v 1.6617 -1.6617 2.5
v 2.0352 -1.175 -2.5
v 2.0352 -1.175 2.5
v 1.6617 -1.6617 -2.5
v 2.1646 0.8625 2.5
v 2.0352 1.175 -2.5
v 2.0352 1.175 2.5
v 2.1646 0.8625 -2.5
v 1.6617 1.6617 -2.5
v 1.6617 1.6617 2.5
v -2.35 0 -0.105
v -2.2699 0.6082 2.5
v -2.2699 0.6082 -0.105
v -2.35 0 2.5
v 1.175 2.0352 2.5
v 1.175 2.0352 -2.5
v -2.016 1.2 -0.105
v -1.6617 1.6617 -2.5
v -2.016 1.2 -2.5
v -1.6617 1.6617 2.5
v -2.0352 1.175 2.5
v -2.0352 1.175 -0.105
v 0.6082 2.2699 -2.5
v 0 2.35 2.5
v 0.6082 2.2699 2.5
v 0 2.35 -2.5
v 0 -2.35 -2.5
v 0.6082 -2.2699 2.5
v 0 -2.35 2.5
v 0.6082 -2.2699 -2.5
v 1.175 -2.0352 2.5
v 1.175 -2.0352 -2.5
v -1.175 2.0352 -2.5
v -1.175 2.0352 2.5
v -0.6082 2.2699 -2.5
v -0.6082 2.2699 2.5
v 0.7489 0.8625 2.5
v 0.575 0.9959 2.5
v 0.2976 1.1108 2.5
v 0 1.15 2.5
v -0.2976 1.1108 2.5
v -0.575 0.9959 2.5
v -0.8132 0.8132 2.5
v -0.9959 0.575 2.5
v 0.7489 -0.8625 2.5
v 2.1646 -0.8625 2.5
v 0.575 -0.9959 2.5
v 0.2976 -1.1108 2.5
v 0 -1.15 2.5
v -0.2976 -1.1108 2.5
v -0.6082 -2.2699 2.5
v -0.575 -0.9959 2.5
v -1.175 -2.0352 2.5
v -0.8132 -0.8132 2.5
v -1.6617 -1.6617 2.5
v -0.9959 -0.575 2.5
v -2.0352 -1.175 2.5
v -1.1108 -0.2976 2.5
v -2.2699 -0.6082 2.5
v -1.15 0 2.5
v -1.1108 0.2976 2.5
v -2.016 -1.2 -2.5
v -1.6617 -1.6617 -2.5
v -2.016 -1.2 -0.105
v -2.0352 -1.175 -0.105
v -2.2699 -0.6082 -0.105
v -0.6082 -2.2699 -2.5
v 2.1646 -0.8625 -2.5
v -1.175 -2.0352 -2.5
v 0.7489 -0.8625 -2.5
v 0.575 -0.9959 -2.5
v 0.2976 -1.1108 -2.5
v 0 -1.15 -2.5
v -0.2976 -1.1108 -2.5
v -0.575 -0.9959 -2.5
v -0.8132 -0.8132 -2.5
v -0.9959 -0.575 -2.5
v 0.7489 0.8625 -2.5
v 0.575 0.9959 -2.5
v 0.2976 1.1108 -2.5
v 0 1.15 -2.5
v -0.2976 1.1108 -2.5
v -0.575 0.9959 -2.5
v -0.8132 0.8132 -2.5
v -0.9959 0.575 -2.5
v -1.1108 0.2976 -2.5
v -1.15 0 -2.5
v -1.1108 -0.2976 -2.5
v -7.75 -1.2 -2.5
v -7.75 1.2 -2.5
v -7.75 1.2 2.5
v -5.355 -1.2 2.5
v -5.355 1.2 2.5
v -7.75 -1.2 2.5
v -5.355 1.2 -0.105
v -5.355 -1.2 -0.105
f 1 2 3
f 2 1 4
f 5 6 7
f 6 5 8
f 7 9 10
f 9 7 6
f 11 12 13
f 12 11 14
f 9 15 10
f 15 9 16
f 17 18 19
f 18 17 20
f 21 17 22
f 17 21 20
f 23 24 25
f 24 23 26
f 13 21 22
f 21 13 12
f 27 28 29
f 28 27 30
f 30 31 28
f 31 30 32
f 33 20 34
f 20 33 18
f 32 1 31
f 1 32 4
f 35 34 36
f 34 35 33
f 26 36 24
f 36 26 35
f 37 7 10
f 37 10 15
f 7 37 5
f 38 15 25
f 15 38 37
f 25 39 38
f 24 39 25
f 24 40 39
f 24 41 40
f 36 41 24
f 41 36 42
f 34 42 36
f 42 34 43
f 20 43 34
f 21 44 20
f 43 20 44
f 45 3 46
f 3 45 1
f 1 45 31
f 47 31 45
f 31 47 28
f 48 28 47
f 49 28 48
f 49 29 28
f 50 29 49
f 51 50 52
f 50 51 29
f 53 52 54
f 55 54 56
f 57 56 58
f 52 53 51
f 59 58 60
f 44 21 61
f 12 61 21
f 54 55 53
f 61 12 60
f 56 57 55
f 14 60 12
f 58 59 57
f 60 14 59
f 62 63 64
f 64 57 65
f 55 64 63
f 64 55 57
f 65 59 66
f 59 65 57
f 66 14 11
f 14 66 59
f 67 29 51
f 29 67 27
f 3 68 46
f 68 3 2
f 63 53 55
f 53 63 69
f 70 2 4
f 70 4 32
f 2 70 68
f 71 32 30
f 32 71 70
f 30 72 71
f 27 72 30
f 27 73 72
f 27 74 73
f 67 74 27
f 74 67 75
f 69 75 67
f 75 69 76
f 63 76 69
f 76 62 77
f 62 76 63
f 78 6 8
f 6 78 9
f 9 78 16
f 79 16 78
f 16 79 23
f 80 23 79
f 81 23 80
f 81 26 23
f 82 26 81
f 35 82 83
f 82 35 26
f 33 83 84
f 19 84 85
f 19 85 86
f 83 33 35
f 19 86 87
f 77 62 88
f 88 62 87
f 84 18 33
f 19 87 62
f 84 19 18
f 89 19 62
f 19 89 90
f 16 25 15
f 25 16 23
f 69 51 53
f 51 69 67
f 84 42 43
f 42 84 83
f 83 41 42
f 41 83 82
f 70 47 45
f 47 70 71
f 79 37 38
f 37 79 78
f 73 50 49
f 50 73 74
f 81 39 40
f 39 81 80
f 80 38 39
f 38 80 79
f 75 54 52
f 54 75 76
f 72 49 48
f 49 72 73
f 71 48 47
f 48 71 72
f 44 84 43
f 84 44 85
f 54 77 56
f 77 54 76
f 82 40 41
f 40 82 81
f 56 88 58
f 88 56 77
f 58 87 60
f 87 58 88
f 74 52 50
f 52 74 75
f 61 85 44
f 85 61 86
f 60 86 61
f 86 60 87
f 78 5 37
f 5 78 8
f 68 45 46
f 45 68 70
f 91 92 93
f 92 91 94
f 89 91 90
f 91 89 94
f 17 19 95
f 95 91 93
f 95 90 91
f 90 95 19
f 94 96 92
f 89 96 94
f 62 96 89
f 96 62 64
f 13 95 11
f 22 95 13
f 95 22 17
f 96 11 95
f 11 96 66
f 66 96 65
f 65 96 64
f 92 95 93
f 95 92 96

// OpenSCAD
wire_diameter = 2.3; //mm
height = 5; //mm
thickness = 1.2; //mm
hook_length = 6; //mm
$fn=24;

opening=0.75*wire_diameter;

union() {
  // clip
  difference() {
    cylinder(d=2*thickness+wire_diameter,h = height, center = true);
    cylinder(d=wire_diameter,h = height + 0.1, center = true);
    translate([(wire_diameter + thickness)/2,0,0]) {
      cube([thickness+wire_diameter/2, opening, height+0.1], center = true);
    }
  }
  // hook
  translate([-((wire_diameter+thickness)/2 + hook_length/2),0,0]) {
    difference() {
      cube([hook_length, thickness*2, height], center = true);
      translate([thickness,0,thickness*2]) {
        cube([hook_length-2*thickness+0.01, 2*thickness+0.01, height+0.01], center = true);
      }
    }
  }
}
